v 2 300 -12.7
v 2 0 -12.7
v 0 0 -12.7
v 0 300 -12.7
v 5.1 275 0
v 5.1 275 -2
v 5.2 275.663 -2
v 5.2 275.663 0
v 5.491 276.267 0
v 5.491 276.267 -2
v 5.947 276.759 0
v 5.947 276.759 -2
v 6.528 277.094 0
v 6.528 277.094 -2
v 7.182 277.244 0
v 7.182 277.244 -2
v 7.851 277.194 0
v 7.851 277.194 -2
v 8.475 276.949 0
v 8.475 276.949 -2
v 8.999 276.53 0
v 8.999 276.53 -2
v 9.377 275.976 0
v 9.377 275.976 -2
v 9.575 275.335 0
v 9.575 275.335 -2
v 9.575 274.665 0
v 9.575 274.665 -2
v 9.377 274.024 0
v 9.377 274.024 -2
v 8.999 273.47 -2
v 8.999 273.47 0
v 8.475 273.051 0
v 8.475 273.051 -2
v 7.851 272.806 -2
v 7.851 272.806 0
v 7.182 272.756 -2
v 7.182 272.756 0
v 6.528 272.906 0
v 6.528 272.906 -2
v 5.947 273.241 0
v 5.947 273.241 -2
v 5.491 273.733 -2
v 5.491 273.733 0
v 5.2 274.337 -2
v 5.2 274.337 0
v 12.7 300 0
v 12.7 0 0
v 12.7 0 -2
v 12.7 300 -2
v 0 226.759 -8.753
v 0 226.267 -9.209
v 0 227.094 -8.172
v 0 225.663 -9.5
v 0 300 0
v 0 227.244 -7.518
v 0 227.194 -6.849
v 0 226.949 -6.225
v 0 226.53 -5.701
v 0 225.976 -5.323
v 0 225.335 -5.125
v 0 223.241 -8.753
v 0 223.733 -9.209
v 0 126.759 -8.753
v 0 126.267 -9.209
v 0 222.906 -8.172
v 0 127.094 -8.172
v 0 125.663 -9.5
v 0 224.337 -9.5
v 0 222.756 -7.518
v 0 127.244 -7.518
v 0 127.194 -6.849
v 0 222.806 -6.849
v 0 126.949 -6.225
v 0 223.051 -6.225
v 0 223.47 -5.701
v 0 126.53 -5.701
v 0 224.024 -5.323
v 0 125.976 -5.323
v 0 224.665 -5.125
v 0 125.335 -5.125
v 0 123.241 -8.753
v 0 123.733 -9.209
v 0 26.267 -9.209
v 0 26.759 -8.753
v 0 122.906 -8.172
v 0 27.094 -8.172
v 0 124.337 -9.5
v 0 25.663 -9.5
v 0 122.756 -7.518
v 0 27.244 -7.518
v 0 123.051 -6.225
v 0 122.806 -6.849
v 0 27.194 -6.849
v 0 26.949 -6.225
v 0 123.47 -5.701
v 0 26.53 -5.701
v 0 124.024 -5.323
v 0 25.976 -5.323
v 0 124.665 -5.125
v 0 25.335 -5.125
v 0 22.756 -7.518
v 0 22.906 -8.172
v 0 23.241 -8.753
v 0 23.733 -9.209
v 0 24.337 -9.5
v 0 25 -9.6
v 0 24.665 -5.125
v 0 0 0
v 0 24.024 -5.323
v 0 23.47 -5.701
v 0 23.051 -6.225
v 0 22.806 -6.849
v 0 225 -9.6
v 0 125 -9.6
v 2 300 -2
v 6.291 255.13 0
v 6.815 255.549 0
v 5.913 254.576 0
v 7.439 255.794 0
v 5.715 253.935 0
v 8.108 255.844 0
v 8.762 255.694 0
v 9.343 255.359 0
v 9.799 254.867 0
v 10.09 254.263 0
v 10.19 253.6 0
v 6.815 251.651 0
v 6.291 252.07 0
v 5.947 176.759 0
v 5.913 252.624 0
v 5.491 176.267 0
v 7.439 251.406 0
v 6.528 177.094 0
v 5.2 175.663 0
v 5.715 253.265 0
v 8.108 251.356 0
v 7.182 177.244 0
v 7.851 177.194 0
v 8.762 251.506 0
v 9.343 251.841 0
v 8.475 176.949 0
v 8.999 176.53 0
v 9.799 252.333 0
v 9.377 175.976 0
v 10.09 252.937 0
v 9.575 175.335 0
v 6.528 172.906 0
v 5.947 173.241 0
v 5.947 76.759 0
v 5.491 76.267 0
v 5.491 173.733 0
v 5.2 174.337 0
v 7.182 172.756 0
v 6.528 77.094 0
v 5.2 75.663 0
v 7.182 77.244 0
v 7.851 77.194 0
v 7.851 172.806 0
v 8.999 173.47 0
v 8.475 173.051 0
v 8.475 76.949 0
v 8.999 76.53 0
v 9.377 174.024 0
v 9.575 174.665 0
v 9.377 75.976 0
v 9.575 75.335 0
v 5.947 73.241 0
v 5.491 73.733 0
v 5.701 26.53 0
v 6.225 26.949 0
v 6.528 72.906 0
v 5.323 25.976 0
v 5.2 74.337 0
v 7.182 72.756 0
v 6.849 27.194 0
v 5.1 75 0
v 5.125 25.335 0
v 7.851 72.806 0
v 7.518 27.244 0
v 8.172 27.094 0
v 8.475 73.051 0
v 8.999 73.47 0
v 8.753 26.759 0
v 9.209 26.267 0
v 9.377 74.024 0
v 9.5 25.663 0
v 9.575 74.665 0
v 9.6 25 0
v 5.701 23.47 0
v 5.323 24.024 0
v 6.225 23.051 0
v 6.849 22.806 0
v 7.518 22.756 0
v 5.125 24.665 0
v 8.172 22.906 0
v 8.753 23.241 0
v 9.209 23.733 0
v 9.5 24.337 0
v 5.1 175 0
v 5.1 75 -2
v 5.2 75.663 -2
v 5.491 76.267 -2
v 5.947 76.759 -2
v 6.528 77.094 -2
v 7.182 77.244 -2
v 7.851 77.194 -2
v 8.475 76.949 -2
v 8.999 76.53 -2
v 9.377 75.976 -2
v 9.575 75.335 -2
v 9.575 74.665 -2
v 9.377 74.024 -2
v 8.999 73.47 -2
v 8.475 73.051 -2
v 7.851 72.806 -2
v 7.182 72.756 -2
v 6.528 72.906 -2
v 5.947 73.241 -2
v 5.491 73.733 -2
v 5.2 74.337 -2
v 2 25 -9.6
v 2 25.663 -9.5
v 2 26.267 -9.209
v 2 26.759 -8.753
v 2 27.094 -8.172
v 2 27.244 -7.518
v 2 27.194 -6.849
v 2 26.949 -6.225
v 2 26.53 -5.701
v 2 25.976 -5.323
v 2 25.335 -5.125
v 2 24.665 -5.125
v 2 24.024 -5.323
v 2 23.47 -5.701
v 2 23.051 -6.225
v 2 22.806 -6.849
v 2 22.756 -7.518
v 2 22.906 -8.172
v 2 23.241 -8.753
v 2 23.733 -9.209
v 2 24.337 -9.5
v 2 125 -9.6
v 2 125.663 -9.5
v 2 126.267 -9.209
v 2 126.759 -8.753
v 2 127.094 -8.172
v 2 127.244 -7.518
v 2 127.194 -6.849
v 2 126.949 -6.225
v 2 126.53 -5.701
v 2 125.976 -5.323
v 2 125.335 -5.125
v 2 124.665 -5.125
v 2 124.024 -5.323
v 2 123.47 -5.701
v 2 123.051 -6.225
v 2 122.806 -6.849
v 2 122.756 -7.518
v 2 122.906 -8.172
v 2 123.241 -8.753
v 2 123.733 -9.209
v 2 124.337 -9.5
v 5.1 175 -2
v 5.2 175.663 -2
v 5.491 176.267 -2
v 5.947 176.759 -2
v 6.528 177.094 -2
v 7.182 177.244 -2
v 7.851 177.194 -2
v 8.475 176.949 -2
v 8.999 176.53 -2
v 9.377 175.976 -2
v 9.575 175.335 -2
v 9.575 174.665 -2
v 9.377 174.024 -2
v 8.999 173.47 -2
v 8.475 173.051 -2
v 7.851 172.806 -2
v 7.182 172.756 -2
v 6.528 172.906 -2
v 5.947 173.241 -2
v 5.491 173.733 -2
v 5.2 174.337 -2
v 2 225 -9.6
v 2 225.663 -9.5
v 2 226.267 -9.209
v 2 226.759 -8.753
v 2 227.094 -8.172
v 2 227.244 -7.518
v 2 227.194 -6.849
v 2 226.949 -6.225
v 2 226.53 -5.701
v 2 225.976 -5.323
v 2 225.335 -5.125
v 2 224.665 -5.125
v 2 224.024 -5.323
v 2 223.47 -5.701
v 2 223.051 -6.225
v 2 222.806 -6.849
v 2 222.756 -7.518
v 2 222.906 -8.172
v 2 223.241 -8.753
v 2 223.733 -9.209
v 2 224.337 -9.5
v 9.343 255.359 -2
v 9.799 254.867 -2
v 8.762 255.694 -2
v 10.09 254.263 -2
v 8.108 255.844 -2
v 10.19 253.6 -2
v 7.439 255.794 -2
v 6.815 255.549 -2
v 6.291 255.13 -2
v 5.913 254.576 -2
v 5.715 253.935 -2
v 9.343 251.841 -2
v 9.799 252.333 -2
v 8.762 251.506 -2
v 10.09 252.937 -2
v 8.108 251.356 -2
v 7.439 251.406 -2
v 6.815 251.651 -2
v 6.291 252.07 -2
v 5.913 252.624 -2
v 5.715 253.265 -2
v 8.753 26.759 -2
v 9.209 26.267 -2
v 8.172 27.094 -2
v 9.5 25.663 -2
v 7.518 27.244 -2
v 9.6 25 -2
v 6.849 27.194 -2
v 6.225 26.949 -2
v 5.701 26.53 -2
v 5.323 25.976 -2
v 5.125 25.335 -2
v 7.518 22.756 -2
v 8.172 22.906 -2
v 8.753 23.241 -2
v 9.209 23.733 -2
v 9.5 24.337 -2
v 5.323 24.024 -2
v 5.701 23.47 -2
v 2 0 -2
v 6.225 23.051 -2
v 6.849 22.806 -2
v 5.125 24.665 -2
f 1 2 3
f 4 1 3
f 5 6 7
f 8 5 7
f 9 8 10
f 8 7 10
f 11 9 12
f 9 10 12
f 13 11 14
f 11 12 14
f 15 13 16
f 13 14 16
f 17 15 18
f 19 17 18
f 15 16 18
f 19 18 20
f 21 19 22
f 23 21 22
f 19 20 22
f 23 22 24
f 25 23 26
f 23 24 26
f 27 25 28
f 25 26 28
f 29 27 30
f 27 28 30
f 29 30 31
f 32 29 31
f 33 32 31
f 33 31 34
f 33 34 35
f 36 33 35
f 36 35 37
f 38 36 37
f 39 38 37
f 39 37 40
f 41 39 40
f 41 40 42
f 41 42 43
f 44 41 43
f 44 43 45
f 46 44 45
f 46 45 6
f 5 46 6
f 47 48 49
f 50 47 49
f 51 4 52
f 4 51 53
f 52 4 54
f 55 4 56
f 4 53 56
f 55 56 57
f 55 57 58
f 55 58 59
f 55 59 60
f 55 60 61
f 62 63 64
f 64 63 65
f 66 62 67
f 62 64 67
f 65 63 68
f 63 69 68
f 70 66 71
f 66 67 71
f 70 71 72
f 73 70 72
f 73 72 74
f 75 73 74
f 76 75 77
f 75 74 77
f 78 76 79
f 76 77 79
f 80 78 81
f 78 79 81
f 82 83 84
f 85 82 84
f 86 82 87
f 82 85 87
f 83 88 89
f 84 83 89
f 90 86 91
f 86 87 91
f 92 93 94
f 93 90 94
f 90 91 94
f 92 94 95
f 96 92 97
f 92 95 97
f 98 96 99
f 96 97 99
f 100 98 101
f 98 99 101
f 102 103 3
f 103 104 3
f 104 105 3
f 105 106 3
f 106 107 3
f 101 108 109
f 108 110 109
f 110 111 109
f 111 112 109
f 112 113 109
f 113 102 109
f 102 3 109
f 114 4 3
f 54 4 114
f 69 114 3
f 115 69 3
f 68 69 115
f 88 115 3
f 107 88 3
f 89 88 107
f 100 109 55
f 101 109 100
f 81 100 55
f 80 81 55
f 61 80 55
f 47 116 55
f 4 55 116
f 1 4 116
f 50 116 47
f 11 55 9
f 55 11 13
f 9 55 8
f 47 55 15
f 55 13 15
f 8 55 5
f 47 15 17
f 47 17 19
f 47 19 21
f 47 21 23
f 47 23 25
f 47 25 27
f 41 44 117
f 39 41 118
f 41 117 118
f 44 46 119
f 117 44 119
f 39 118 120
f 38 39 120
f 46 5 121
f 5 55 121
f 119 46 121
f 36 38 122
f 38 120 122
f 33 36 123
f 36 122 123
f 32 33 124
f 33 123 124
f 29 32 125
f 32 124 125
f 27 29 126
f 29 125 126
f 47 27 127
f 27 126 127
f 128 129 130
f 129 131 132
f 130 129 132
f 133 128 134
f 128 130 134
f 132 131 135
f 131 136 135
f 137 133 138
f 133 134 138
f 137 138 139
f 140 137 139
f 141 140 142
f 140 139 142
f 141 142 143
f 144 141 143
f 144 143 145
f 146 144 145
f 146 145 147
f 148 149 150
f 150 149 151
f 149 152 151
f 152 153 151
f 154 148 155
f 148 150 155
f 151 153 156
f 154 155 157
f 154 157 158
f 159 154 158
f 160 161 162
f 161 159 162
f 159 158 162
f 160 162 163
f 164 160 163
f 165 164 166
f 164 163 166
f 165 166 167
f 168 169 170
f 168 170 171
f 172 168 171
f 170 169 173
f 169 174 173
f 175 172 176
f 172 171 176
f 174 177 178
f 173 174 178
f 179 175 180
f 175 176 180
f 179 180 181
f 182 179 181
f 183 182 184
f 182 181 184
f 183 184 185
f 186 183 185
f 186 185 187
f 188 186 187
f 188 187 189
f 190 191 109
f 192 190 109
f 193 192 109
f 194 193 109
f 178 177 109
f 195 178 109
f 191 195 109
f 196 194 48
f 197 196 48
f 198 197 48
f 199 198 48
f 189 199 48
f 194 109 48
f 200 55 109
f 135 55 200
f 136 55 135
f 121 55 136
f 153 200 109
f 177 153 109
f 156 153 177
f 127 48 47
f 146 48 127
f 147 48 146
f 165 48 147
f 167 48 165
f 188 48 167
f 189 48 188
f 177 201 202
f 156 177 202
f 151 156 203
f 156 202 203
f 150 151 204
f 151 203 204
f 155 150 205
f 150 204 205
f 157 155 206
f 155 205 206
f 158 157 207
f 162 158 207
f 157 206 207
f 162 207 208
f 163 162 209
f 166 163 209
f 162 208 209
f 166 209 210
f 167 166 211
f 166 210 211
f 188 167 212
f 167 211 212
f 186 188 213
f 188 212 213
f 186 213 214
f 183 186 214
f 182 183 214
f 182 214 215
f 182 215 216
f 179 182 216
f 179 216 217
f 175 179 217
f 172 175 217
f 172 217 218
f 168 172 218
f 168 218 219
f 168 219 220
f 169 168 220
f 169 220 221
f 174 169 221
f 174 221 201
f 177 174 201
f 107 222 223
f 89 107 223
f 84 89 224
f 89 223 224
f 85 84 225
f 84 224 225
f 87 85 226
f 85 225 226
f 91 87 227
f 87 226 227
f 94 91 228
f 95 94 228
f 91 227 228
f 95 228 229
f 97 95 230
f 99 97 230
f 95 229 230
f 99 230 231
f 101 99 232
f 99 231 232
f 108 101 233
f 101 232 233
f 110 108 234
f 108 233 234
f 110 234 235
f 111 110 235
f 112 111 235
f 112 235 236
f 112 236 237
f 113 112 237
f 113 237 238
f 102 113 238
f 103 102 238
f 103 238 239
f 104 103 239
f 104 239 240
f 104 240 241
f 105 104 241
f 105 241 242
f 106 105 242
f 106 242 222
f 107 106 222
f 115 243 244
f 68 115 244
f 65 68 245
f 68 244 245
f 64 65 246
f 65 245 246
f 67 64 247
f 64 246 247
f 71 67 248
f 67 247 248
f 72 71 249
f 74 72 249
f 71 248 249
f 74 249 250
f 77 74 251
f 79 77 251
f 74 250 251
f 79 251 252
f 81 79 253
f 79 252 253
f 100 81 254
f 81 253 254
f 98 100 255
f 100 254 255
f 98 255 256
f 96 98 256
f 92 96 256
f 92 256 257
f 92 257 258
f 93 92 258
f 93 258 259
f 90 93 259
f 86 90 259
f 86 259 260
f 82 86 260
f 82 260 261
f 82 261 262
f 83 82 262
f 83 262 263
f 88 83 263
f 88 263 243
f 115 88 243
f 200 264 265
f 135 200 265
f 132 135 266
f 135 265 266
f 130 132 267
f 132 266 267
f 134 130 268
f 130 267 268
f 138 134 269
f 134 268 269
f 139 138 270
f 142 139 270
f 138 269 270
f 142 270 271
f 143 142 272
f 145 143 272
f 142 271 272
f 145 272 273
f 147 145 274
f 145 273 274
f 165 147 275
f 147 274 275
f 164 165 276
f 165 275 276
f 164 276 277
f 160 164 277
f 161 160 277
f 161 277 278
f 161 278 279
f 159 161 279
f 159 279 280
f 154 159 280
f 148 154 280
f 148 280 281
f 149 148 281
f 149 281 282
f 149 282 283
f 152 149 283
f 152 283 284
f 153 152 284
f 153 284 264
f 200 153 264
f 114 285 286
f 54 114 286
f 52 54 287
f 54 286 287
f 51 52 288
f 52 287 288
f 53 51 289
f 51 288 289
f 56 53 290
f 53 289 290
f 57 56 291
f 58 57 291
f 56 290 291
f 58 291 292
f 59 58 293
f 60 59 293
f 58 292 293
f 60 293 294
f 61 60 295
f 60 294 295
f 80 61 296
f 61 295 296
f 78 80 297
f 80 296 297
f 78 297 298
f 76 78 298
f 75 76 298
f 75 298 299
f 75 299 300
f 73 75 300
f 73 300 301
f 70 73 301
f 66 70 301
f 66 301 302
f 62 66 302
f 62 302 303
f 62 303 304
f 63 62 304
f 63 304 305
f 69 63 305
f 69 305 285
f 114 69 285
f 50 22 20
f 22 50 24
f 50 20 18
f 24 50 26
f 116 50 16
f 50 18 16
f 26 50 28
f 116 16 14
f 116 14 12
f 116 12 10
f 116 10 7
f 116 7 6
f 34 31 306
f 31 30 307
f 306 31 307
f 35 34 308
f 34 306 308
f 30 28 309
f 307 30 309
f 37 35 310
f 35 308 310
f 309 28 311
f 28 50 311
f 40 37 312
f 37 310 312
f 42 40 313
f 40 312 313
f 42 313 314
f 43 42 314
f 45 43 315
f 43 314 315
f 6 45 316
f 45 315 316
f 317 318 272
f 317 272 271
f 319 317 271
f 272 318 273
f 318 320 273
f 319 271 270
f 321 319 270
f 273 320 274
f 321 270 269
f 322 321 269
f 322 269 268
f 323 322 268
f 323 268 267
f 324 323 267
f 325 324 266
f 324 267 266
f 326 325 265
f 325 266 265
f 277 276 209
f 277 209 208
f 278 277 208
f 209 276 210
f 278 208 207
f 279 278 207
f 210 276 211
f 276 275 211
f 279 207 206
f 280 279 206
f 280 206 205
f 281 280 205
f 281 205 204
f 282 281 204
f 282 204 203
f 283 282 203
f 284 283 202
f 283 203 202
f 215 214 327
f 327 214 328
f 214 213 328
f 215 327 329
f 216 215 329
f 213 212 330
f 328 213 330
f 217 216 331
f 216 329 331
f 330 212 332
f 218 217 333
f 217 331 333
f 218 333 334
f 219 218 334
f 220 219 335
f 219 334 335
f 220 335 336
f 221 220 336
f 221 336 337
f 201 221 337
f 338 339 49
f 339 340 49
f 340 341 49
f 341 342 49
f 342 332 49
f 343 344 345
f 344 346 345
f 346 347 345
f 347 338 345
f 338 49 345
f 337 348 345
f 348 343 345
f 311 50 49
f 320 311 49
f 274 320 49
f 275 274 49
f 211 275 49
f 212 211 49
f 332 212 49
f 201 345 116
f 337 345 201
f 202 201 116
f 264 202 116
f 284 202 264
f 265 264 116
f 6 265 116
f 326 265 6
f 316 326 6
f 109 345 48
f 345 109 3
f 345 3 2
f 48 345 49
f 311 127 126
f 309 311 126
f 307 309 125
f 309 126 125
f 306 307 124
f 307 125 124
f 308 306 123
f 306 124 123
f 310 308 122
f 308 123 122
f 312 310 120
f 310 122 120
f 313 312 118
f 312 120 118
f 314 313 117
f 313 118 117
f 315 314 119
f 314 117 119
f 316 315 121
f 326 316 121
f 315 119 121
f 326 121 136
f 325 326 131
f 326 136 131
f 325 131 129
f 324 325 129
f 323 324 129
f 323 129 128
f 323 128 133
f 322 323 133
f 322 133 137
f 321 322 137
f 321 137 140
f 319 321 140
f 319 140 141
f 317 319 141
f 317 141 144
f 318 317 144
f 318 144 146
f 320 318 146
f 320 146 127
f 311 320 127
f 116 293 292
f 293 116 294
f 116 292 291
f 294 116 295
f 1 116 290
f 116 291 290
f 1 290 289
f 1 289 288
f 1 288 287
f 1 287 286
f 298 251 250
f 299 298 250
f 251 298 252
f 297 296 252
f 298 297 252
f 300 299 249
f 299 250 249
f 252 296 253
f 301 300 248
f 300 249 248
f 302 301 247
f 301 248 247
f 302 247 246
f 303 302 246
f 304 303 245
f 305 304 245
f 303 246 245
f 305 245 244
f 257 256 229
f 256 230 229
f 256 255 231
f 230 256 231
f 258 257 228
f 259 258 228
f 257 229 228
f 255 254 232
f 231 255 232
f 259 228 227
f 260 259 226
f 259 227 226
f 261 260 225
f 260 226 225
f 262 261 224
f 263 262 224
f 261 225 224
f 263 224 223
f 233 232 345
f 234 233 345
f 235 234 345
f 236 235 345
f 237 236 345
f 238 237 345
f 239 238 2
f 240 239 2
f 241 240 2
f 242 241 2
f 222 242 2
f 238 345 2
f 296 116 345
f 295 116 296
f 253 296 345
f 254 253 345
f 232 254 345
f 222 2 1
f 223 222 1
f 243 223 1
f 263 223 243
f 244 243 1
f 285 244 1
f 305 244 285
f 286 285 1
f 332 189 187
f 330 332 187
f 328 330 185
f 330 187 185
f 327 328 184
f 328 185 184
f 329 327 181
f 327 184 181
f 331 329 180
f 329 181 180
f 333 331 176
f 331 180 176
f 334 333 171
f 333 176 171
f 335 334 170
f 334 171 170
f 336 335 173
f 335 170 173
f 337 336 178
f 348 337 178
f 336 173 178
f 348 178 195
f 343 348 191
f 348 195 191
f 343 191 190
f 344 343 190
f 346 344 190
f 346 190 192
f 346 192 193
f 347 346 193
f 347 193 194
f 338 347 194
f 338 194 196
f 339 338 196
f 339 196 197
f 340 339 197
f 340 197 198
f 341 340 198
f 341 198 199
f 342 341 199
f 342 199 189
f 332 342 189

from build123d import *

# Parameters (mm, degrees)
BOSS_EXTRUDE1_DEPTH = 300
SKETCH3_R           = 2.25
CUT_EXTRUDE1_DEPTH  = 300
SKETCH6_R           = 2.25
CUT_EXTRUDE2_DEPTH  = 10
SKETCH8_R           = 2.25
CUT_EXTRUDE3_DEPTH  = 10


with BuildPart() as part:
    # Sketch1 → Boss-Extrude1 (new body)
    with BuildSketch(Plane(origin=(0, 0, 0), x_dir=(1, 0, 0), z_dir=(0, 1, 0))):
        Polygon((0, 0), (12.7, 0), (12.7, 2), (2, 2), (2, 12.7), (0, 12.7), align=None)
    extrude(amount=BOSS_EXTRUDE1_DEPTH)

    # Sketch3 → Cut-Extrude1 (cut)
    with BuildSketch(Plane(origin=(0, 0, -2), x_dir=(-1, 0, 0), z_dir=(0, 0, -1))):
        with Locations((-7.35, 275)):
            Circle(SKETCH3_R)
        with Locations((-7.35, 175)):
            Circle(SKETCH3_R)
        with Locations((-7.35, 75)):
            Circle(SKETCH3_R)
    extrude(amount=-CUT_EXTRUDE1_DEPTH, mode=Mode.SUBTRACT)

    # Sketch6 → Cut-Extrude2 (cut)
    with BuildSketch(Plane(origin=(2, 0, 0), x_dir=(0, 0, -1), z_dir=(1, 0, 0))):
        with Locations((7.35, 225)):
            Circle(SKETCH6_R)
        with Locations((7.35, 125)):
            Circle(SKETCH6_R)
        with Locations((7.35, 25)):
            Circle(SKETCH6_R)
    extrude(amount=-CUT_EXTRUDE2_DEPTH, mode=Mode.SUBTRACT)

    # Sketch8 → Cut-Extrude3 (cut)
    with BuildSketch(Plane.XY):
        with Locations((7.94, 253.6)):
            Circle(SKETCH8_R)
        with Locations((7.35, 25)):
            Circle(SKETCH8_R)
    extrude(amount=-CUT_EXTRUDE3_DEPTH, mode=Mode.SUBTRACT)


solid = part.part
